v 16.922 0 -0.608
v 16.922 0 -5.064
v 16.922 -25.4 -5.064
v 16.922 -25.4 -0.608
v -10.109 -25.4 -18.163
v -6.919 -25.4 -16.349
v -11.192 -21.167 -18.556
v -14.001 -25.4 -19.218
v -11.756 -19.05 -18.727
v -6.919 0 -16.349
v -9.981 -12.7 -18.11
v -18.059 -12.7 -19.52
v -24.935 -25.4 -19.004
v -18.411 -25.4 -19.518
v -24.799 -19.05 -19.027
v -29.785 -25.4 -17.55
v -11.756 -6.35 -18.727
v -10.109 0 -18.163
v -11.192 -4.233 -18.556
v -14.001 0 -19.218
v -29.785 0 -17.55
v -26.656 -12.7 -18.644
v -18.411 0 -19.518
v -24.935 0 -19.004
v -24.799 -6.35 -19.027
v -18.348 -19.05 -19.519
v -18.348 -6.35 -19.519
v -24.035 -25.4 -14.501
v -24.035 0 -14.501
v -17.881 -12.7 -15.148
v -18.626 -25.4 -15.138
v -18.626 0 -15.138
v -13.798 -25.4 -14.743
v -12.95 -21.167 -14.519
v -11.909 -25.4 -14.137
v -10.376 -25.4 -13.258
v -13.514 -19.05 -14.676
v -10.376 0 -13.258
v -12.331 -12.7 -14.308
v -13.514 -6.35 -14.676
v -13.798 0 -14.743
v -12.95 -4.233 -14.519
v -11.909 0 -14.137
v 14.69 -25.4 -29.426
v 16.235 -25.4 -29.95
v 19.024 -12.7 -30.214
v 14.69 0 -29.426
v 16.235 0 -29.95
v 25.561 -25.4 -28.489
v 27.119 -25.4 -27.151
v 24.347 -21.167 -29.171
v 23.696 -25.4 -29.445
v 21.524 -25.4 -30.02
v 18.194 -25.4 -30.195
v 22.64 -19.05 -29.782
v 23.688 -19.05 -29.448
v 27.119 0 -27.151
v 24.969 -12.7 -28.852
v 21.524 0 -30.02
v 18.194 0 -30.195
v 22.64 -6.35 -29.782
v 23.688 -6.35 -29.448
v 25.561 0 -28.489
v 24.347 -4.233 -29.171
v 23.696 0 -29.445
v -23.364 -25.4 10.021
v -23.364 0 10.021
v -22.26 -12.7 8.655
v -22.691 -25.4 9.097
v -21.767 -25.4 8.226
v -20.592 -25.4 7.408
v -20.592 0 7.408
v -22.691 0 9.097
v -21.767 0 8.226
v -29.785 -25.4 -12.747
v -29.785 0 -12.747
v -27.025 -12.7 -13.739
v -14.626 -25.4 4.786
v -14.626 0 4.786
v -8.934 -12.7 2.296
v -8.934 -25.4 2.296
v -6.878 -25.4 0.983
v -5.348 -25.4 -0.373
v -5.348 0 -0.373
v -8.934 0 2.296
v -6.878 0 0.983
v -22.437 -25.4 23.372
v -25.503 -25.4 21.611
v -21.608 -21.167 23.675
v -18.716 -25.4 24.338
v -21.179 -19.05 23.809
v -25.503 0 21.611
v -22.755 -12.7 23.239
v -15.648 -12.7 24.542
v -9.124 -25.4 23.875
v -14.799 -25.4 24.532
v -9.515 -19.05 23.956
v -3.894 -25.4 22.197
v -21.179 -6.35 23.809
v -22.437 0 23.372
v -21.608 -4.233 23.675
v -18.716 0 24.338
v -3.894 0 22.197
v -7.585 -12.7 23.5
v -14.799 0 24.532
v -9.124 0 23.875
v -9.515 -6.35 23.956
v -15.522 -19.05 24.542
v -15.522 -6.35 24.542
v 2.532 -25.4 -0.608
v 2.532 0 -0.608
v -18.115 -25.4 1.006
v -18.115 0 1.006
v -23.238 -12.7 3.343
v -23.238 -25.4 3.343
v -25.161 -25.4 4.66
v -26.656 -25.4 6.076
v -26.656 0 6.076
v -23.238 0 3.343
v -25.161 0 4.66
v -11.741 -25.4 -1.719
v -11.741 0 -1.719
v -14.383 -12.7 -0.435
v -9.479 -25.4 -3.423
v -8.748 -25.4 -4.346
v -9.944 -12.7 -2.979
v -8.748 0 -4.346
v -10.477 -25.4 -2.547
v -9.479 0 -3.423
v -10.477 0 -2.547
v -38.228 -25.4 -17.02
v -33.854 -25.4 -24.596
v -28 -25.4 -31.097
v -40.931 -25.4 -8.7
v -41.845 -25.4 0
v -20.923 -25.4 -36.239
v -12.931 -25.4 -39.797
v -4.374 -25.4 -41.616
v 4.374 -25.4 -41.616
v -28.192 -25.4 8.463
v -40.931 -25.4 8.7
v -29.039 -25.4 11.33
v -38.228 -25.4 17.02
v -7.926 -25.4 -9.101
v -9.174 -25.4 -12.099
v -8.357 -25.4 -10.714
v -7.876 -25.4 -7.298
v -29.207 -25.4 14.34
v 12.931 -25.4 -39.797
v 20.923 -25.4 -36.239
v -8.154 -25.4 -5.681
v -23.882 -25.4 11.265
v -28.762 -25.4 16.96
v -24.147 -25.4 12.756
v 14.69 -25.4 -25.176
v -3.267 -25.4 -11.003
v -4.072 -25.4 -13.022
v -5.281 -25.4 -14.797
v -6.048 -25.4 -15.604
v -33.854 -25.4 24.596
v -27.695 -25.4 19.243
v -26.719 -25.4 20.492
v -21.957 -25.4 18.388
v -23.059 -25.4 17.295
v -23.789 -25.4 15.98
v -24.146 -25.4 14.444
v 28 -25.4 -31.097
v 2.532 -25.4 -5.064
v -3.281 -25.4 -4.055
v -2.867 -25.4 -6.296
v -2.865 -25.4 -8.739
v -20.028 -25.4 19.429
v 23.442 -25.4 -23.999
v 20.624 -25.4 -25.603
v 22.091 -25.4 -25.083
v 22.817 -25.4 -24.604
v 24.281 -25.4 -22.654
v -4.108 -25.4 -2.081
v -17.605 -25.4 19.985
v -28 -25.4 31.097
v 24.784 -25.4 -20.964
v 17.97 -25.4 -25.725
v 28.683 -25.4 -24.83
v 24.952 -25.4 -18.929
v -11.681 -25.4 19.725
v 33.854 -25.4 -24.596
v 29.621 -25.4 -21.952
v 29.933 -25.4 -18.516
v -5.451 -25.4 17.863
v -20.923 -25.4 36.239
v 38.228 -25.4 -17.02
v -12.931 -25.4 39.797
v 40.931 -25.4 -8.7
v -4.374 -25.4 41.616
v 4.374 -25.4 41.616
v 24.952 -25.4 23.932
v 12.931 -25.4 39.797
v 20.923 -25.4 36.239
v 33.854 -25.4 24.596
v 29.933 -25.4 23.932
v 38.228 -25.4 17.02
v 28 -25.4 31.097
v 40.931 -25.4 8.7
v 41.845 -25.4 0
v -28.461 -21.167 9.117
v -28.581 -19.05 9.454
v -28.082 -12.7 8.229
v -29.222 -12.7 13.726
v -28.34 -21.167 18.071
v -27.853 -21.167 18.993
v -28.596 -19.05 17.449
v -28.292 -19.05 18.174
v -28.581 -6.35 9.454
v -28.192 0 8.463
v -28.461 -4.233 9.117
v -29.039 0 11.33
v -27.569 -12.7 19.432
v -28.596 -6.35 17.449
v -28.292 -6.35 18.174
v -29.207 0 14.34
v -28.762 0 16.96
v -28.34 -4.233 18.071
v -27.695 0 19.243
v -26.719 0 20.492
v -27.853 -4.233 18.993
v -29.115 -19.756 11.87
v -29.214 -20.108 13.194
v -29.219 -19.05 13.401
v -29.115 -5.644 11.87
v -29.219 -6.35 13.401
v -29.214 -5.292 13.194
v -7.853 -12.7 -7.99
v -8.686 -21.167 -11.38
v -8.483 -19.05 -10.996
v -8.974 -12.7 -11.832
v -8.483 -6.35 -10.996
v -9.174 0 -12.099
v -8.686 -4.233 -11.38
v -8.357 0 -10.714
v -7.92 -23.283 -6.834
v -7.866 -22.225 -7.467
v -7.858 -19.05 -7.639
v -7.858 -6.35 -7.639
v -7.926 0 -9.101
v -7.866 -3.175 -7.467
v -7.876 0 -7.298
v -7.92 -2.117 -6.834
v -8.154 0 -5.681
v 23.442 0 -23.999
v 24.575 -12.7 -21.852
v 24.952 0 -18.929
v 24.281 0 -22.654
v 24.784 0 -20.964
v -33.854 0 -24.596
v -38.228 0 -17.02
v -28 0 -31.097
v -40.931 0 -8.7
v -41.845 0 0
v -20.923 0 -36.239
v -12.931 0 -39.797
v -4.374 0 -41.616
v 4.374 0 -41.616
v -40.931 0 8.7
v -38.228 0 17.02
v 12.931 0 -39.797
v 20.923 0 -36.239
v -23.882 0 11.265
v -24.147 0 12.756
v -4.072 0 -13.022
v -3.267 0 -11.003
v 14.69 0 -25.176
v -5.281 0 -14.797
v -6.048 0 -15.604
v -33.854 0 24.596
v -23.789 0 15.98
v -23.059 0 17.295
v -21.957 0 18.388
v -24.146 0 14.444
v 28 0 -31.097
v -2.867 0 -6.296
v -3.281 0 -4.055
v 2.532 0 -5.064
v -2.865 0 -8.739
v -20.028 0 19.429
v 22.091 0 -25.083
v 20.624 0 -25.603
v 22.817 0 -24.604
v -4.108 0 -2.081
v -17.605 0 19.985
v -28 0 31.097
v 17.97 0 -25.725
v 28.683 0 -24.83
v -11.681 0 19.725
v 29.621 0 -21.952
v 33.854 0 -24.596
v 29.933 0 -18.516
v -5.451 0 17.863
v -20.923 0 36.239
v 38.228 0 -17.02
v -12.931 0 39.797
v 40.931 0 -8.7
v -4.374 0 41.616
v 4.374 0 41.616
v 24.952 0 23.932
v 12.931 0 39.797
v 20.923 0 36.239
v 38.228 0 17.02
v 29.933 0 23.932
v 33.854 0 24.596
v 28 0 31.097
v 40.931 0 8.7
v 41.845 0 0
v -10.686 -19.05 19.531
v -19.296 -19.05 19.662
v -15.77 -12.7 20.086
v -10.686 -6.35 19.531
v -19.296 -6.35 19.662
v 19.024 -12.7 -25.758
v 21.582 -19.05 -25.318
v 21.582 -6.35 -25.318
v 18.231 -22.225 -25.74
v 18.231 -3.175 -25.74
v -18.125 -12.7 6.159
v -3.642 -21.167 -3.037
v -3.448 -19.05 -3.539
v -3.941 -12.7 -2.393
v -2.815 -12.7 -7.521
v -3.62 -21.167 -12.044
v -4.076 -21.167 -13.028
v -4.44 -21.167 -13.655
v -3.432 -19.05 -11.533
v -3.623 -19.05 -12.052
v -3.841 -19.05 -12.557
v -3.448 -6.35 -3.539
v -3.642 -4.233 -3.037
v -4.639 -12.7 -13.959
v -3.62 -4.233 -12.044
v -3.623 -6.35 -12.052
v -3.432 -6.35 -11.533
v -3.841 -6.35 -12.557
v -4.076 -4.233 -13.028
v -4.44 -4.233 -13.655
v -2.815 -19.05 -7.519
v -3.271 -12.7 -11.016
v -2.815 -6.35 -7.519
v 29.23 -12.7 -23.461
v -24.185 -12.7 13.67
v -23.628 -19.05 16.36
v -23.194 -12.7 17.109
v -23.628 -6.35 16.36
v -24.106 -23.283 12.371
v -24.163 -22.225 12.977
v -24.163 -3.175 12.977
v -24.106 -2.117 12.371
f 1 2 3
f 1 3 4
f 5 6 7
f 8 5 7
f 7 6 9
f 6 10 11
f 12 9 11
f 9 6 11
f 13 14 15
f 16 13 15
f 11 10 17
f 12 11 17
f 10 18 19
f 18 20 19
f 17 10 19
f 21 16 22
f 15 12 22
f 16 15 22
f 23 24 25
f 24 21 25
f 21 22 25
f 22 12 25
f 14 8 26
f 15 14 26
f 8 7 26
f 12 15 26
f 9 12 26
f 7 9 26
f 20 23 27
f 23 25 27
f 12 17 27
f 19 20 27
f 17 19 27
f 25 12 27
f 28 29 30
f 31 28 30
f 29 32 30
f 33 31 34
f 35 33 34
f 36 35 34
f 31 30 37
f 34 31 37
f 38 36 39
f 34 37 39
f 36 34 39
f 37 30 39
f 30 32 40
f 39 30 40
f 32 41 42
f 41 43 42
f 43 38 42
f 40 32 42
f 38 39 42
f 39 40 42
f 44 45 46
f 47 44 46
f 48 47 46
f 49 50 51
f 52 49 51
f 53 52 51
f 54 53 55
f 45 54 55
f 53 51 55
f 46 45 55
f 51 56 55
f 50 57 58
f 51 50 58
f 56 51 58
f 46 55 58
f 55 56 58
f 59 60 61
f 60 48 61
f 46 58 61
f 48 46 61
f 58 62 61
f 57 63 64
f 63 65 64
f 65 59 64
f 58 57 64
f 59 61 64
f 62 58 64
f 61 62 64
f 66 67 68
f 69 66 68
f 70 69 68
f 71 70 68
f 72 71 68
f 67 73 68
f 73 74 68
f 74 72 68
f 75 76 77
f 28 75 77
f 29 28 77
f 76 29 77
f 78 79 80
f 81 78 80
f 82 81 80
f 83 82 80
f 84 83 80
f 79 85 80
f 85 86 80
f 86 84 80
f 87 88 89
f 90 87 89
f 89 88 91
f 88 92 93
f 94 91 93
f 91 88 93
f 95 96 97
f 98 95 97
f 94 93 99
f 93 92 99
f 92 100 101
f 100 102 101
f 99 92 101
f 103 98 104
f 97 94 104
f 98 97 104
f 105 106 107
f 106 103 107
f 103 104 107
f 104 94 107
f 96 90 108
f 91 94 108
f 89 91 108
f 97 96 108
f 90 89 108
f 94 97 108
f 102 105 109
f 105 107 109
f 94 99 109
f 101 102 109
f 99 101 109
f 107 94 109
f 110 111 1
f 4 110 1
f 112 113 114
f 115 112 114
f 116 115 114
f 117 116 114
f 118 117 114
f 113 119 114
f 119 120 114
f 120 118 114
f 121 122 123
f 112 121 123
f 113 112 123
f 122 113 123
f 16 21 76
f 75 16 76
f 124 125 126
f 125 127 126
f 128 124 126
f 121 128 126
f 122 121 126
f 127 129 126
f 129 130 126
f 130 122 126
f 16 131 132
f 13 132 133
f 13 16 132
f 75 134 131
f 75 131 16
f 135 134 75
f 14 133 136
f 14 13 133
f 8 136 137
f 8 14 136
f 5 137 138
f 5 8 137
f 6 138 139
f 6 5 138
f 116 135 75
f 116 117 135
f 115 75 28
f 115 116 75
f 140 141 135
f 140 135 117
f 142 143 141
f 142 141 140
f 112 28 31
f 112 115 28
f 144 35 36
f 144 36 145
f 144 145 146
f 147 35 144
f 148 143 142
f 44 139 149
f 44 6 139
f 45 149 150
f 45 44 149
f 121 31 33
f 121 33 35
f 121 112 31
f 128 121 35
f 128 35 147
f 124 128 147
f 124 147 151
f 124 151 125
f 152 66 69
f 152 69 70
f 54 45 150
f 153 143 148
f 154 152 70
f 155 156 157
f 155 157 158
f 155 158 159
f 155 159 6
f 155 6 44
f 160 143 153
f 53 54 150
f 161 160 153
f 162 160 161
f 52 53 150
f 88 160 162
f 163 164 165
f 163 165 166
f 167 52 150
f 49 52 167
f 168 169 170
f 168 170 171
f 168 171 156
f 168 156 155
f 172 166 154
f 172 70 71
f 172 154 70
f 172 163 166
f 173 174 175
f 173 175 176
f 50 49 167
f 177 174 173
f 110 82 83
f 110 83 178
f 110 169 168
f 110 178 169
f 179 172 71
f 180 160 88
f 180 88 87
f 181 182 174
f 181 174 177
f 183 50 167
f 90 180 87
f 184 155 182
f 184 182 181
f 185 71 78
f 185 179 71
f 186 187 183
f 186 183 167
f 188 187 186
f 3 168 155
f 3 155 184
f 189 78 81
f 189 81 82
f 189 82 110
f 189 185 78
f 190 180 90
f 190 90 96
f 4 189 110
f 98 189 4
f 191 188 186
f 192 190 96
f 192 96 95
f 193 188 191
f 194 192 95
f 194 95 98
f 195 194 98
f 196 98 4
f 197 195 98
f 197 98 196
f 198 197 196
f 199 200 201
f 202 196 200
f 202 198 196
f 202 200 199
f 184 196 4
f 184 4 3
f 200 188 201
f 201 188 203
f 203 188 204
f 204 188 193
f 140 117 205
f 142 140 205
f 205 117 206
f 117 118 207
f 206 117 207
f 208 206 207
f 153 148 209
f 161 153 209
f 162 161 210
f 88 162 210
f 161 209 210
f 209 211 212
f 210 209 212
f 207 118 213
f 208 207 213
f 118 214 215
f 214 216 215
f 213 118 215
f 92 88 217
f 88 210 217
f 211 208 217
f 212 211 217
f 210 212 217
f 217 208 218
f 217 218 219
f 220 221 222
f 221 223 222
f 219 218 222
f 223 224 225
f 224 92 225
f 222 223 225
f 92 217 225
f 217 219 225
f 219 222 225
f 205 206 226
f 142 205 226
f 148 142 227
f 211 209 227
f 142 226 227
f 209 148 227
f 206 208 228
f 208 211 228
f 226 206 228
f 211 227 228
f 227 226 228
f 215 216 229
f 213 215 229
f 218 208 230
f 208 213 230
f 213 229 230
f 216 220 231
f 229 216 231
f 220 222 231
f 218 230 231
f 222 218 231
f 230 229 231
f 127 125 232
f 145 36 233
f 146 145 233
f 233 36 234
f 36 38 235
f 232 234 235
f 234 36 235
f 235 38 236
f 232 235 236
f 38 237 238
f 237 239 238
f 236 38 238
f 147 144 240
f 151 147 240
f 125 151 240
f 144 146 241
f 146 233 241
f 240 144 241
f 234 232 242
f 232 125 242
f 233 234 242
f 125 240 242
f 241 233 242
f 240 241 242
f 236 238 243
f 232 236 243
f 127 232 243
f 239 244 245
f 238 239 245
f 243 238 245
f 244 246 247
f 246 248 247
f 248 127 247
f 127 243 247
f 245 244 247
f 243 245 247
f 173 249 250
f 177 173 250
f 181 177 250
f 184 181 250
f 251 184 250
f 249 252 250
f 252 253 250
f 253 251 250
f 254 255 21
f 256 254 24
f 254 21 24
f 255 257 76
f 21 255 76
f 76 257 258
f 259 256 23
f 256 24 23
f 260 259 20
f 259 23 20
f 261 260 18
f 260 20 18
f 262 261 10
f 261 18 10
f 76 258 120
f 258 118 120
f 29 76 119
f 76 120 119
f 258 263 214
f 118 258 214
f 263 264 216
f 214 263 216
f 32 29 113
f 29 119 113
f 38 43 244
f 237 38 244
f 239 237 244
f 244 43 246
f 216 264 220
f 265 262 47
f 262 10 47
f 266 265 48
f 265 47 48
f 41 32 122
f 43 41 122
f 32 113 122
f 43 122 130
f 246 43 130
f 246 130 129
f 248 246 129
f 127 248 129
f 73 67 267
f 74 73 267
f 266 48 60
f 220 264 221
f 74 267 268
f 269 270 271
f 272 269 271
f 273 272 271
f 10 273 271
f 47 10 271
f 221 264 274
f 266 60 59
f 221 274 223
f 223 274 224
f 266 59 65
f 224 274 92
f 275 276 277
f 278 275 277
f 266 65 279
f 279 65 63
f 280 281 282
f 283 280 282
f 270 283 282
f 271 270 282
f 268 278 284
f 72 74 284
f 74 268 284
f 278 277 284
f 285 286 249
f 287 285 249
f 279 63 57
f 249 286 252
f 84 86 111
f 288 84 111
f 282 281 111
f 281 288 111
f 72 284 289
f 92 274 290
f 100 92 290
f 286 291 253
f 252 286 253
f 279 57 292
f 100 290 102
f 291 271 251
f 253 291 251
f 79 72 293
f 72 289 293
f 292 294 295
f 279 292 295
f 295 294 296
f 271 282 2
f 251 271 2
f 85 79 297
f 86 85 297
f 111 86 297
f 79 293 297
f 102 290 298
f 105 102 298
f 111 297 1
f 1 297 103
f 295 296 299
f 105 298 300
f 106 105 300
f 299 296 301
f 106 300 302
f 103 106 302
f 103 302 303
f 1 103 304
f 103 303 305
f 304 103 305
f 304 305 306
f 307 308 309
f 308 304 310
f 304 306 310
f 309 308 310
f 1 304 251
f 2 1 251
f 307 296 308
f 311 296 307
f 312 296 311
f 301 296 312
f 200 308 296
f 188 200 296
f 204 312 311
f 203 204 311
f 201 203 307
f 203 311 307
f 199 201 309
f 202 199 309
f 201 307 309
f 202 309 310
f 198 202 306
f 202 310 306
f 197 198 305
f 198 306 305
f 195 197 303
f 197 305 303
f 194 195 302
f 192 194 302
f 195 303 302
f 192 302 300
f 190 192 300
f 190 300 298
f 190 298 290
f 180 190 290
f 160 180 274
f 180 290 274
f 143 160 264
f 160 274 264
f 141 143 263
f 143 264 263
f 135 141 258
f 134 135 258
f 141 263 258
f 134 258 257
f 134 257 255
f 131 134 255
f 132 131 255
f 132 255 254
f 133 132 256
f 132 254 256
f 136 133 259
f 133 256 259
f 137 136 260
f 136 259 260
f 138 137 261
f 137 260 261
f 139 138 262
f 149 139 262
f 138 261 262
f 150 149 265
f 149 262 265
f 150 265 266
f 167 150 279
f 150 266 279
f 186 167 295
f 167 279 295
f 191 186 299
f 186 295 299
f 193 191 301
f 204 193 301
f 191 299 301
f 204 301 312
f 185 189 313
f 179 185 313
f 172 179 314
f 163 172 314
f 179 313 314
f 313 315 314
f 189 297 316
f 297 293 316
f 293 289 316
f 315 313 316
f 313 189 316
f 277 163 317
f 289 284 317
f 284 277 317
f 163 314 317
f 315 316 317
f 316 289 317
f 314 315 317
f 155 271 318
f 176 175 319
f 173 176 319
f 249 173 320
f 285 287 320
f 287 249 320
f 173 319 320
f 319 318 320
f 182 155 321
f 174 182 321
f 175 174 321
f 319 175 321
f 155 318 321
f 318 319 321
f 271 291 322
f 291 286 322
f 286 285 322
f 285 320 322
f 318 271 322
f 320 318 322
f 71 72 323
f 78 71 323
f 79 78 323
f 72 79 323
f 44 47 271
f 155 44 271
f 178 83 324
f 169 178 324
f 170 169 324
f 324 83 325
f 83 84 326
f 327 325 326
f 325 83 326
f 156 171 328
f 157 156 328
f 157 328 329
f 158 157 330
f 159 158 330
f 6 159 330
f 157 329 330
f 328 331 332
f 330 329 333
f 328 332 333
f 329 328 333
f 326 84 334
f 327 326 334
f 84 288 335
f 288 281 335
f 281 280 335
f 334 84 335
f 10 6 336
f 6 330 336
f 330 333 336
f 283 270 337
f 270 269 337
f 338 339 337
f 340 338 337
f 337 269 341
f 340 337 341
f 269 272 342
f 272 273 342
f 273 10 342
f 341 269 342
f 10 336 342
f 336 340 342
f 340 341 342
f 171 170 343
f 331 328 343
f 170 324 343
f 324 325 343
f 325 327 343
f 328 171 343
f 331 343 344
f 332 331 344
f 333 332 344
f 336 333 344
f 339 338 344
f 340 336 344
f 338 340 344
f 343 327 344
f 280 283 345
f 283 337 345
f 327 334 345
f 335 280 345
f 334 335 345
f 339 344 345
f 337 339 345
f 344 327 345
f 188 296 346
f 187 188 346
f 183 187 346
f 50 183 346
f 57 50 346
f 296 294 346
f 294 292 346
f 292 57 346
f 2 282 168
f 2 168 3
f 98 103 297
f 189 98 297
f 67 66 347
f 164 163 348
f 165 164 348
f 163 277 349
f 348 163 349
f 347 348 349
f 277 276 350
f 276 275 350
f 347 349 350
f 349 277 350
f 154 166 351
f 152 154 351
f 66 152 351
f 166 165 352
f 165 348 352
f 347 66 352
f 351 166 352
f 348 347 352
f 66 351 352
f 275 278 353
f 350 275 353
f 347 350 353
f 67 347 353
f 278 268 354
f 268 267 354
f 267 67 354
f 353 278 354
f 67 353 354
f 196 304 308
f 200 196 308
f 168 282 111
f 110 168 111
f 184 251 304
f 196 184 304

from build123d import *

# Parameters (mm, degrees)
F0_R     = 41.8452571416
F0_W     = 14.3901980304
F0_H     = 4.4558957395
F1_DEPTH = 25.4


with BuildPart() as f1:
    # F0 (on Front) → F1 (new body)
    with BuildSketch(Plane.XZ):
        Circle(F0_R)
        with Locations((9.7271105858, -2.8357197633)):
            Rectangle(F0_W, F0_H, mode=Mode.SUBTRACT)
        with BuildLine():
            add(Edge.make_bspline(
                [(27.1191752197, -27.1508392515), (24.304925279, -30.2136812703), (19.0235162235, -30.2136812703)],
                knots=[0, 0, 0, 1, 1, 1], degree=2))
            add(Edge.make_bspline(
                [(19.0235162235, -30.2136812703), (16.2749321147, -30.2136812703), (14.6895713147, -29.4256912869)],
                knots=[0, 0, 0, 1, 1, 1], degree=2))
            Line((14.6895713147, -29.4256912869), (14.6895713147, -25.1761738764))
            add(Edge.make_bspline(
                [(14.6895713147, -25.1761738764), (16.7721162709, -25.7577855308), (19.0235162235, -25.7577855308)],
                knots=[0, 0, 0, 1, 1, 1], degree=2))
            add(Edge.make_bspline(
                [(19.0235162235, -25.7577855308), (21.9315744956, -25.7577855308), (23.4418886305, -23.9988793178)],
                knots=[0, 0, 0, 1, 1, 1], degree=2))
            add(Edge.make_bspline(
                [(23.4418886305, -23.9988793178), (24.9522027653, -22.2399731049), (24.9522027653, -18.9285390079)],
                knots=[0, 0, 0, 1, 1, 1], degree=2))
            Line((24.9522027653, -18.9285390079), (24.9522027653, 23.9324875899))
            Line((24.9522027653, 23.9324875899), (29.9334251605, 23.9324875899))
            Line((29.9334251605, 23.9324875899), (29.9334251605, -18.5157823499))
            add(Edge.make_bspline(
                [(29.9334251605, -18.5157823499), (29.9334251605, -24.0879972326), (27.1191752197, -27.1508392515)],
                knots=[0, 0, 0, 1, 1, 1], degree=2))
        make_face(mode=Mode.SUBTRACT)
        with BuildLine():
            add(Edge.make_bspline(
                [(-5.3478882635, -0.3732510652), (-2.8150633168, -3.1312160071), (-2.8150633168, -7.5214459147)],
                knots=[0, 0, 0, 1, 1, 1], degree=2))
            add(Edge.make_bspline(
                [(-2.8150633168, -7.5214459147), (-2.8150633168, -13.1780882956), (-6.9191778138, -16.3488098955)],
                knots=[0, 0, 0, 1, 1, 1], degree=2))
            add(Edge.make_bspline(
                [(-6.9191778138, -16.3488098955), (-11.0232923107, -19.5195314955), (-18.0589171626, -19.5195314955)],
                knots=[0, 0, 0, 1, 1, 1], degree=2))
            add(Edge.make_bspline(
                [(-18.0589171626, -19.5195314955), (-25.6761536689, -19.5195314955), (-29.7849585824, -17.5495565369)],
                knots=[0, 0, 0, 1, 1, 1], degree=2))
            Line((-29.7849585824, -17.5495565369), (-29.7849585824, -12.7465699714))
            add(Edge.make_bspline(
                [(-29.7849585824, -12.7465699714), (-27.1395636381, -13.8535082814), (-24.0345078702, -14.5007857678)],
                knots=[0, 0, 0, 1, 1, 1], degree=2))
            add(Edge.make_bspline(
                [(-24.0345078702, -14.5007857678), (-20.9294521022, -15.1480632541), (-17.880681333, -15.1480632541)],
                knots=[0, 0, 0, 1, 1, 1], degree=2))
            add(Edge.make_bspline(
                [(-17.880681333, -15.1480632541), (-12.8994589379, -15.1480632541), (-10.3760148243, -13.2578253773)],
                knots=[0, 0, 0, 1, 1, 1], degree=2))
            add(Edge.make_bspline(
                [(-10.3760148243, -13.2578253773), (-7.8525707108, -11.3675875004), (-7.8525707108, -7.9904875715)],
                knots=[0, 0, 0, 1, 1, 1], degree=2))
            add(Edge.make_bspline(
                [(-7.8525707108, -7.9904875715), (-7.8525707108, -5.7672301183), (-8.7484402753, -4.3460338982)],
                knots=[0, 0, 0, 1, 1, 1], degree=2))
            add(Edge.make_bspline(
                [(-8.7484402753, -4.3460338982), (-9.6443098397, -2.9248376781), (-11.7409260456, -1.7194006202)],
                knots=[0, 0, 0, 1, 1, 1], degree=2))
            add(Edge.make_bspline(
                [(-11.7409260456, -1.7194006202), (-13.8375422515, -0.5139635622), (-18.1152021614, 1.0057314058)],
                knots=[0, 0, 0, 1, 1, 1], degree=2))
            add(Edge.make_bspline(
                [(-18.1152021614, 1.0057314058), (-24.090792869, 3.1445613608), (-26.6564507316, 6.0760717157)],
                knots=[0, 0, 0, 1, 1, 1], degree=2))
            add(Edge.make_bspline(
                [(-26.6564507316, 6.0760717157), (-29.2221085943, 9.0075820707), (-29.2221085943, 13.726141138)],
                knots=[0, 0, 0, 1, 1, 1], degree=2))
            add(Edge.make_bspline(
                [(-29.2221085943, 13.726141138), (-29.2221085943, 18.6792210338), (-25.5026082559, 21.6107313887)],
                knots=[0, 0, 0, 1, 1, 1], degree=2))
            add(Edge.make_bspline(
                [(-25.5026082559, 21.6107313887), (-21.7831079175, 24.5422417437), (-15.6480430467, 24.5422417437)],
                knots=[0, 0, 0, 1, 1, 1], degree=2))
            add(Edge.make_bspline(
                [(-15.6480430467, 24.5422417437), (-9.2596956812, 24.5422417437), (-3.8938591275, 22.1970334597)],
                knots=[0, 0, 0, 1, 1, 1], degree=2))
            Line((-3.8938591275, 22.1970334597), (-5.451077428, 17.863088551))
            add(Edge.make_bspline(
                [(-5.451077428, 17.863088551), (-10.7606289829, 20.0863460042), (-15.7699938775, 20.0863460042)],
                knots=[0, 0, 0, 1, 1, 1], degree=2))
            add(Edge.make_bspline(
                [(-15.7699938775, 20.0863460042), (-19.7287054608, 20.0863460042), (-21.9566533306, 18.3884152066)],
                knots=[0, 0, 0, 1, 1, 1], degree=2))
            add(Edge.make_bspline(
                [(-21.9566533306, 18.3884152066), (-24.1846012003, 16.690484409), (-24.1846012003, 13.6698561392)],
                knots=[0, 0, 0, 1, 1, 1], degree=2))
            add(Edge.make_bspline(
                [(-24.1846012003, 13.6698561392), (-24.1846012003, 11.446598686), (-23.3637783009, 10.0207120494)],
                knots=[0, 0, 0, 1, 1, 1], degree=2))
            add(Edge.make_bspline(
                [(-23.3637783009, 10.0207120494), (-22.5429554016, 8.5948254127), (-20.5917421093, 7.408150021)],
                knots=[0, 0, 0, 1, 1, 1], degree=2))
            add(Edge.make_bspline(
                [(-20.5917421093, 7.408150021), (-18.640528817, 6.2214746294), (-14.6255322349, 4.7862071596)],
                knots=[0, 0, 0, 1, 1, 1], degree=2))
            add(Edge.make_bspline(
                [(-14.6255322349, 4.7862071596), (-7.8807132102, 2.3847138768), (-5.3478882635, -0.3732510652)],
                knots=[0, 0, 0, 1, 1, 1], degree=2))
        make_face(mode=Mode.SUBTRACT)
    extrude(amount=F1_DEPTH)


solid = f1.part
